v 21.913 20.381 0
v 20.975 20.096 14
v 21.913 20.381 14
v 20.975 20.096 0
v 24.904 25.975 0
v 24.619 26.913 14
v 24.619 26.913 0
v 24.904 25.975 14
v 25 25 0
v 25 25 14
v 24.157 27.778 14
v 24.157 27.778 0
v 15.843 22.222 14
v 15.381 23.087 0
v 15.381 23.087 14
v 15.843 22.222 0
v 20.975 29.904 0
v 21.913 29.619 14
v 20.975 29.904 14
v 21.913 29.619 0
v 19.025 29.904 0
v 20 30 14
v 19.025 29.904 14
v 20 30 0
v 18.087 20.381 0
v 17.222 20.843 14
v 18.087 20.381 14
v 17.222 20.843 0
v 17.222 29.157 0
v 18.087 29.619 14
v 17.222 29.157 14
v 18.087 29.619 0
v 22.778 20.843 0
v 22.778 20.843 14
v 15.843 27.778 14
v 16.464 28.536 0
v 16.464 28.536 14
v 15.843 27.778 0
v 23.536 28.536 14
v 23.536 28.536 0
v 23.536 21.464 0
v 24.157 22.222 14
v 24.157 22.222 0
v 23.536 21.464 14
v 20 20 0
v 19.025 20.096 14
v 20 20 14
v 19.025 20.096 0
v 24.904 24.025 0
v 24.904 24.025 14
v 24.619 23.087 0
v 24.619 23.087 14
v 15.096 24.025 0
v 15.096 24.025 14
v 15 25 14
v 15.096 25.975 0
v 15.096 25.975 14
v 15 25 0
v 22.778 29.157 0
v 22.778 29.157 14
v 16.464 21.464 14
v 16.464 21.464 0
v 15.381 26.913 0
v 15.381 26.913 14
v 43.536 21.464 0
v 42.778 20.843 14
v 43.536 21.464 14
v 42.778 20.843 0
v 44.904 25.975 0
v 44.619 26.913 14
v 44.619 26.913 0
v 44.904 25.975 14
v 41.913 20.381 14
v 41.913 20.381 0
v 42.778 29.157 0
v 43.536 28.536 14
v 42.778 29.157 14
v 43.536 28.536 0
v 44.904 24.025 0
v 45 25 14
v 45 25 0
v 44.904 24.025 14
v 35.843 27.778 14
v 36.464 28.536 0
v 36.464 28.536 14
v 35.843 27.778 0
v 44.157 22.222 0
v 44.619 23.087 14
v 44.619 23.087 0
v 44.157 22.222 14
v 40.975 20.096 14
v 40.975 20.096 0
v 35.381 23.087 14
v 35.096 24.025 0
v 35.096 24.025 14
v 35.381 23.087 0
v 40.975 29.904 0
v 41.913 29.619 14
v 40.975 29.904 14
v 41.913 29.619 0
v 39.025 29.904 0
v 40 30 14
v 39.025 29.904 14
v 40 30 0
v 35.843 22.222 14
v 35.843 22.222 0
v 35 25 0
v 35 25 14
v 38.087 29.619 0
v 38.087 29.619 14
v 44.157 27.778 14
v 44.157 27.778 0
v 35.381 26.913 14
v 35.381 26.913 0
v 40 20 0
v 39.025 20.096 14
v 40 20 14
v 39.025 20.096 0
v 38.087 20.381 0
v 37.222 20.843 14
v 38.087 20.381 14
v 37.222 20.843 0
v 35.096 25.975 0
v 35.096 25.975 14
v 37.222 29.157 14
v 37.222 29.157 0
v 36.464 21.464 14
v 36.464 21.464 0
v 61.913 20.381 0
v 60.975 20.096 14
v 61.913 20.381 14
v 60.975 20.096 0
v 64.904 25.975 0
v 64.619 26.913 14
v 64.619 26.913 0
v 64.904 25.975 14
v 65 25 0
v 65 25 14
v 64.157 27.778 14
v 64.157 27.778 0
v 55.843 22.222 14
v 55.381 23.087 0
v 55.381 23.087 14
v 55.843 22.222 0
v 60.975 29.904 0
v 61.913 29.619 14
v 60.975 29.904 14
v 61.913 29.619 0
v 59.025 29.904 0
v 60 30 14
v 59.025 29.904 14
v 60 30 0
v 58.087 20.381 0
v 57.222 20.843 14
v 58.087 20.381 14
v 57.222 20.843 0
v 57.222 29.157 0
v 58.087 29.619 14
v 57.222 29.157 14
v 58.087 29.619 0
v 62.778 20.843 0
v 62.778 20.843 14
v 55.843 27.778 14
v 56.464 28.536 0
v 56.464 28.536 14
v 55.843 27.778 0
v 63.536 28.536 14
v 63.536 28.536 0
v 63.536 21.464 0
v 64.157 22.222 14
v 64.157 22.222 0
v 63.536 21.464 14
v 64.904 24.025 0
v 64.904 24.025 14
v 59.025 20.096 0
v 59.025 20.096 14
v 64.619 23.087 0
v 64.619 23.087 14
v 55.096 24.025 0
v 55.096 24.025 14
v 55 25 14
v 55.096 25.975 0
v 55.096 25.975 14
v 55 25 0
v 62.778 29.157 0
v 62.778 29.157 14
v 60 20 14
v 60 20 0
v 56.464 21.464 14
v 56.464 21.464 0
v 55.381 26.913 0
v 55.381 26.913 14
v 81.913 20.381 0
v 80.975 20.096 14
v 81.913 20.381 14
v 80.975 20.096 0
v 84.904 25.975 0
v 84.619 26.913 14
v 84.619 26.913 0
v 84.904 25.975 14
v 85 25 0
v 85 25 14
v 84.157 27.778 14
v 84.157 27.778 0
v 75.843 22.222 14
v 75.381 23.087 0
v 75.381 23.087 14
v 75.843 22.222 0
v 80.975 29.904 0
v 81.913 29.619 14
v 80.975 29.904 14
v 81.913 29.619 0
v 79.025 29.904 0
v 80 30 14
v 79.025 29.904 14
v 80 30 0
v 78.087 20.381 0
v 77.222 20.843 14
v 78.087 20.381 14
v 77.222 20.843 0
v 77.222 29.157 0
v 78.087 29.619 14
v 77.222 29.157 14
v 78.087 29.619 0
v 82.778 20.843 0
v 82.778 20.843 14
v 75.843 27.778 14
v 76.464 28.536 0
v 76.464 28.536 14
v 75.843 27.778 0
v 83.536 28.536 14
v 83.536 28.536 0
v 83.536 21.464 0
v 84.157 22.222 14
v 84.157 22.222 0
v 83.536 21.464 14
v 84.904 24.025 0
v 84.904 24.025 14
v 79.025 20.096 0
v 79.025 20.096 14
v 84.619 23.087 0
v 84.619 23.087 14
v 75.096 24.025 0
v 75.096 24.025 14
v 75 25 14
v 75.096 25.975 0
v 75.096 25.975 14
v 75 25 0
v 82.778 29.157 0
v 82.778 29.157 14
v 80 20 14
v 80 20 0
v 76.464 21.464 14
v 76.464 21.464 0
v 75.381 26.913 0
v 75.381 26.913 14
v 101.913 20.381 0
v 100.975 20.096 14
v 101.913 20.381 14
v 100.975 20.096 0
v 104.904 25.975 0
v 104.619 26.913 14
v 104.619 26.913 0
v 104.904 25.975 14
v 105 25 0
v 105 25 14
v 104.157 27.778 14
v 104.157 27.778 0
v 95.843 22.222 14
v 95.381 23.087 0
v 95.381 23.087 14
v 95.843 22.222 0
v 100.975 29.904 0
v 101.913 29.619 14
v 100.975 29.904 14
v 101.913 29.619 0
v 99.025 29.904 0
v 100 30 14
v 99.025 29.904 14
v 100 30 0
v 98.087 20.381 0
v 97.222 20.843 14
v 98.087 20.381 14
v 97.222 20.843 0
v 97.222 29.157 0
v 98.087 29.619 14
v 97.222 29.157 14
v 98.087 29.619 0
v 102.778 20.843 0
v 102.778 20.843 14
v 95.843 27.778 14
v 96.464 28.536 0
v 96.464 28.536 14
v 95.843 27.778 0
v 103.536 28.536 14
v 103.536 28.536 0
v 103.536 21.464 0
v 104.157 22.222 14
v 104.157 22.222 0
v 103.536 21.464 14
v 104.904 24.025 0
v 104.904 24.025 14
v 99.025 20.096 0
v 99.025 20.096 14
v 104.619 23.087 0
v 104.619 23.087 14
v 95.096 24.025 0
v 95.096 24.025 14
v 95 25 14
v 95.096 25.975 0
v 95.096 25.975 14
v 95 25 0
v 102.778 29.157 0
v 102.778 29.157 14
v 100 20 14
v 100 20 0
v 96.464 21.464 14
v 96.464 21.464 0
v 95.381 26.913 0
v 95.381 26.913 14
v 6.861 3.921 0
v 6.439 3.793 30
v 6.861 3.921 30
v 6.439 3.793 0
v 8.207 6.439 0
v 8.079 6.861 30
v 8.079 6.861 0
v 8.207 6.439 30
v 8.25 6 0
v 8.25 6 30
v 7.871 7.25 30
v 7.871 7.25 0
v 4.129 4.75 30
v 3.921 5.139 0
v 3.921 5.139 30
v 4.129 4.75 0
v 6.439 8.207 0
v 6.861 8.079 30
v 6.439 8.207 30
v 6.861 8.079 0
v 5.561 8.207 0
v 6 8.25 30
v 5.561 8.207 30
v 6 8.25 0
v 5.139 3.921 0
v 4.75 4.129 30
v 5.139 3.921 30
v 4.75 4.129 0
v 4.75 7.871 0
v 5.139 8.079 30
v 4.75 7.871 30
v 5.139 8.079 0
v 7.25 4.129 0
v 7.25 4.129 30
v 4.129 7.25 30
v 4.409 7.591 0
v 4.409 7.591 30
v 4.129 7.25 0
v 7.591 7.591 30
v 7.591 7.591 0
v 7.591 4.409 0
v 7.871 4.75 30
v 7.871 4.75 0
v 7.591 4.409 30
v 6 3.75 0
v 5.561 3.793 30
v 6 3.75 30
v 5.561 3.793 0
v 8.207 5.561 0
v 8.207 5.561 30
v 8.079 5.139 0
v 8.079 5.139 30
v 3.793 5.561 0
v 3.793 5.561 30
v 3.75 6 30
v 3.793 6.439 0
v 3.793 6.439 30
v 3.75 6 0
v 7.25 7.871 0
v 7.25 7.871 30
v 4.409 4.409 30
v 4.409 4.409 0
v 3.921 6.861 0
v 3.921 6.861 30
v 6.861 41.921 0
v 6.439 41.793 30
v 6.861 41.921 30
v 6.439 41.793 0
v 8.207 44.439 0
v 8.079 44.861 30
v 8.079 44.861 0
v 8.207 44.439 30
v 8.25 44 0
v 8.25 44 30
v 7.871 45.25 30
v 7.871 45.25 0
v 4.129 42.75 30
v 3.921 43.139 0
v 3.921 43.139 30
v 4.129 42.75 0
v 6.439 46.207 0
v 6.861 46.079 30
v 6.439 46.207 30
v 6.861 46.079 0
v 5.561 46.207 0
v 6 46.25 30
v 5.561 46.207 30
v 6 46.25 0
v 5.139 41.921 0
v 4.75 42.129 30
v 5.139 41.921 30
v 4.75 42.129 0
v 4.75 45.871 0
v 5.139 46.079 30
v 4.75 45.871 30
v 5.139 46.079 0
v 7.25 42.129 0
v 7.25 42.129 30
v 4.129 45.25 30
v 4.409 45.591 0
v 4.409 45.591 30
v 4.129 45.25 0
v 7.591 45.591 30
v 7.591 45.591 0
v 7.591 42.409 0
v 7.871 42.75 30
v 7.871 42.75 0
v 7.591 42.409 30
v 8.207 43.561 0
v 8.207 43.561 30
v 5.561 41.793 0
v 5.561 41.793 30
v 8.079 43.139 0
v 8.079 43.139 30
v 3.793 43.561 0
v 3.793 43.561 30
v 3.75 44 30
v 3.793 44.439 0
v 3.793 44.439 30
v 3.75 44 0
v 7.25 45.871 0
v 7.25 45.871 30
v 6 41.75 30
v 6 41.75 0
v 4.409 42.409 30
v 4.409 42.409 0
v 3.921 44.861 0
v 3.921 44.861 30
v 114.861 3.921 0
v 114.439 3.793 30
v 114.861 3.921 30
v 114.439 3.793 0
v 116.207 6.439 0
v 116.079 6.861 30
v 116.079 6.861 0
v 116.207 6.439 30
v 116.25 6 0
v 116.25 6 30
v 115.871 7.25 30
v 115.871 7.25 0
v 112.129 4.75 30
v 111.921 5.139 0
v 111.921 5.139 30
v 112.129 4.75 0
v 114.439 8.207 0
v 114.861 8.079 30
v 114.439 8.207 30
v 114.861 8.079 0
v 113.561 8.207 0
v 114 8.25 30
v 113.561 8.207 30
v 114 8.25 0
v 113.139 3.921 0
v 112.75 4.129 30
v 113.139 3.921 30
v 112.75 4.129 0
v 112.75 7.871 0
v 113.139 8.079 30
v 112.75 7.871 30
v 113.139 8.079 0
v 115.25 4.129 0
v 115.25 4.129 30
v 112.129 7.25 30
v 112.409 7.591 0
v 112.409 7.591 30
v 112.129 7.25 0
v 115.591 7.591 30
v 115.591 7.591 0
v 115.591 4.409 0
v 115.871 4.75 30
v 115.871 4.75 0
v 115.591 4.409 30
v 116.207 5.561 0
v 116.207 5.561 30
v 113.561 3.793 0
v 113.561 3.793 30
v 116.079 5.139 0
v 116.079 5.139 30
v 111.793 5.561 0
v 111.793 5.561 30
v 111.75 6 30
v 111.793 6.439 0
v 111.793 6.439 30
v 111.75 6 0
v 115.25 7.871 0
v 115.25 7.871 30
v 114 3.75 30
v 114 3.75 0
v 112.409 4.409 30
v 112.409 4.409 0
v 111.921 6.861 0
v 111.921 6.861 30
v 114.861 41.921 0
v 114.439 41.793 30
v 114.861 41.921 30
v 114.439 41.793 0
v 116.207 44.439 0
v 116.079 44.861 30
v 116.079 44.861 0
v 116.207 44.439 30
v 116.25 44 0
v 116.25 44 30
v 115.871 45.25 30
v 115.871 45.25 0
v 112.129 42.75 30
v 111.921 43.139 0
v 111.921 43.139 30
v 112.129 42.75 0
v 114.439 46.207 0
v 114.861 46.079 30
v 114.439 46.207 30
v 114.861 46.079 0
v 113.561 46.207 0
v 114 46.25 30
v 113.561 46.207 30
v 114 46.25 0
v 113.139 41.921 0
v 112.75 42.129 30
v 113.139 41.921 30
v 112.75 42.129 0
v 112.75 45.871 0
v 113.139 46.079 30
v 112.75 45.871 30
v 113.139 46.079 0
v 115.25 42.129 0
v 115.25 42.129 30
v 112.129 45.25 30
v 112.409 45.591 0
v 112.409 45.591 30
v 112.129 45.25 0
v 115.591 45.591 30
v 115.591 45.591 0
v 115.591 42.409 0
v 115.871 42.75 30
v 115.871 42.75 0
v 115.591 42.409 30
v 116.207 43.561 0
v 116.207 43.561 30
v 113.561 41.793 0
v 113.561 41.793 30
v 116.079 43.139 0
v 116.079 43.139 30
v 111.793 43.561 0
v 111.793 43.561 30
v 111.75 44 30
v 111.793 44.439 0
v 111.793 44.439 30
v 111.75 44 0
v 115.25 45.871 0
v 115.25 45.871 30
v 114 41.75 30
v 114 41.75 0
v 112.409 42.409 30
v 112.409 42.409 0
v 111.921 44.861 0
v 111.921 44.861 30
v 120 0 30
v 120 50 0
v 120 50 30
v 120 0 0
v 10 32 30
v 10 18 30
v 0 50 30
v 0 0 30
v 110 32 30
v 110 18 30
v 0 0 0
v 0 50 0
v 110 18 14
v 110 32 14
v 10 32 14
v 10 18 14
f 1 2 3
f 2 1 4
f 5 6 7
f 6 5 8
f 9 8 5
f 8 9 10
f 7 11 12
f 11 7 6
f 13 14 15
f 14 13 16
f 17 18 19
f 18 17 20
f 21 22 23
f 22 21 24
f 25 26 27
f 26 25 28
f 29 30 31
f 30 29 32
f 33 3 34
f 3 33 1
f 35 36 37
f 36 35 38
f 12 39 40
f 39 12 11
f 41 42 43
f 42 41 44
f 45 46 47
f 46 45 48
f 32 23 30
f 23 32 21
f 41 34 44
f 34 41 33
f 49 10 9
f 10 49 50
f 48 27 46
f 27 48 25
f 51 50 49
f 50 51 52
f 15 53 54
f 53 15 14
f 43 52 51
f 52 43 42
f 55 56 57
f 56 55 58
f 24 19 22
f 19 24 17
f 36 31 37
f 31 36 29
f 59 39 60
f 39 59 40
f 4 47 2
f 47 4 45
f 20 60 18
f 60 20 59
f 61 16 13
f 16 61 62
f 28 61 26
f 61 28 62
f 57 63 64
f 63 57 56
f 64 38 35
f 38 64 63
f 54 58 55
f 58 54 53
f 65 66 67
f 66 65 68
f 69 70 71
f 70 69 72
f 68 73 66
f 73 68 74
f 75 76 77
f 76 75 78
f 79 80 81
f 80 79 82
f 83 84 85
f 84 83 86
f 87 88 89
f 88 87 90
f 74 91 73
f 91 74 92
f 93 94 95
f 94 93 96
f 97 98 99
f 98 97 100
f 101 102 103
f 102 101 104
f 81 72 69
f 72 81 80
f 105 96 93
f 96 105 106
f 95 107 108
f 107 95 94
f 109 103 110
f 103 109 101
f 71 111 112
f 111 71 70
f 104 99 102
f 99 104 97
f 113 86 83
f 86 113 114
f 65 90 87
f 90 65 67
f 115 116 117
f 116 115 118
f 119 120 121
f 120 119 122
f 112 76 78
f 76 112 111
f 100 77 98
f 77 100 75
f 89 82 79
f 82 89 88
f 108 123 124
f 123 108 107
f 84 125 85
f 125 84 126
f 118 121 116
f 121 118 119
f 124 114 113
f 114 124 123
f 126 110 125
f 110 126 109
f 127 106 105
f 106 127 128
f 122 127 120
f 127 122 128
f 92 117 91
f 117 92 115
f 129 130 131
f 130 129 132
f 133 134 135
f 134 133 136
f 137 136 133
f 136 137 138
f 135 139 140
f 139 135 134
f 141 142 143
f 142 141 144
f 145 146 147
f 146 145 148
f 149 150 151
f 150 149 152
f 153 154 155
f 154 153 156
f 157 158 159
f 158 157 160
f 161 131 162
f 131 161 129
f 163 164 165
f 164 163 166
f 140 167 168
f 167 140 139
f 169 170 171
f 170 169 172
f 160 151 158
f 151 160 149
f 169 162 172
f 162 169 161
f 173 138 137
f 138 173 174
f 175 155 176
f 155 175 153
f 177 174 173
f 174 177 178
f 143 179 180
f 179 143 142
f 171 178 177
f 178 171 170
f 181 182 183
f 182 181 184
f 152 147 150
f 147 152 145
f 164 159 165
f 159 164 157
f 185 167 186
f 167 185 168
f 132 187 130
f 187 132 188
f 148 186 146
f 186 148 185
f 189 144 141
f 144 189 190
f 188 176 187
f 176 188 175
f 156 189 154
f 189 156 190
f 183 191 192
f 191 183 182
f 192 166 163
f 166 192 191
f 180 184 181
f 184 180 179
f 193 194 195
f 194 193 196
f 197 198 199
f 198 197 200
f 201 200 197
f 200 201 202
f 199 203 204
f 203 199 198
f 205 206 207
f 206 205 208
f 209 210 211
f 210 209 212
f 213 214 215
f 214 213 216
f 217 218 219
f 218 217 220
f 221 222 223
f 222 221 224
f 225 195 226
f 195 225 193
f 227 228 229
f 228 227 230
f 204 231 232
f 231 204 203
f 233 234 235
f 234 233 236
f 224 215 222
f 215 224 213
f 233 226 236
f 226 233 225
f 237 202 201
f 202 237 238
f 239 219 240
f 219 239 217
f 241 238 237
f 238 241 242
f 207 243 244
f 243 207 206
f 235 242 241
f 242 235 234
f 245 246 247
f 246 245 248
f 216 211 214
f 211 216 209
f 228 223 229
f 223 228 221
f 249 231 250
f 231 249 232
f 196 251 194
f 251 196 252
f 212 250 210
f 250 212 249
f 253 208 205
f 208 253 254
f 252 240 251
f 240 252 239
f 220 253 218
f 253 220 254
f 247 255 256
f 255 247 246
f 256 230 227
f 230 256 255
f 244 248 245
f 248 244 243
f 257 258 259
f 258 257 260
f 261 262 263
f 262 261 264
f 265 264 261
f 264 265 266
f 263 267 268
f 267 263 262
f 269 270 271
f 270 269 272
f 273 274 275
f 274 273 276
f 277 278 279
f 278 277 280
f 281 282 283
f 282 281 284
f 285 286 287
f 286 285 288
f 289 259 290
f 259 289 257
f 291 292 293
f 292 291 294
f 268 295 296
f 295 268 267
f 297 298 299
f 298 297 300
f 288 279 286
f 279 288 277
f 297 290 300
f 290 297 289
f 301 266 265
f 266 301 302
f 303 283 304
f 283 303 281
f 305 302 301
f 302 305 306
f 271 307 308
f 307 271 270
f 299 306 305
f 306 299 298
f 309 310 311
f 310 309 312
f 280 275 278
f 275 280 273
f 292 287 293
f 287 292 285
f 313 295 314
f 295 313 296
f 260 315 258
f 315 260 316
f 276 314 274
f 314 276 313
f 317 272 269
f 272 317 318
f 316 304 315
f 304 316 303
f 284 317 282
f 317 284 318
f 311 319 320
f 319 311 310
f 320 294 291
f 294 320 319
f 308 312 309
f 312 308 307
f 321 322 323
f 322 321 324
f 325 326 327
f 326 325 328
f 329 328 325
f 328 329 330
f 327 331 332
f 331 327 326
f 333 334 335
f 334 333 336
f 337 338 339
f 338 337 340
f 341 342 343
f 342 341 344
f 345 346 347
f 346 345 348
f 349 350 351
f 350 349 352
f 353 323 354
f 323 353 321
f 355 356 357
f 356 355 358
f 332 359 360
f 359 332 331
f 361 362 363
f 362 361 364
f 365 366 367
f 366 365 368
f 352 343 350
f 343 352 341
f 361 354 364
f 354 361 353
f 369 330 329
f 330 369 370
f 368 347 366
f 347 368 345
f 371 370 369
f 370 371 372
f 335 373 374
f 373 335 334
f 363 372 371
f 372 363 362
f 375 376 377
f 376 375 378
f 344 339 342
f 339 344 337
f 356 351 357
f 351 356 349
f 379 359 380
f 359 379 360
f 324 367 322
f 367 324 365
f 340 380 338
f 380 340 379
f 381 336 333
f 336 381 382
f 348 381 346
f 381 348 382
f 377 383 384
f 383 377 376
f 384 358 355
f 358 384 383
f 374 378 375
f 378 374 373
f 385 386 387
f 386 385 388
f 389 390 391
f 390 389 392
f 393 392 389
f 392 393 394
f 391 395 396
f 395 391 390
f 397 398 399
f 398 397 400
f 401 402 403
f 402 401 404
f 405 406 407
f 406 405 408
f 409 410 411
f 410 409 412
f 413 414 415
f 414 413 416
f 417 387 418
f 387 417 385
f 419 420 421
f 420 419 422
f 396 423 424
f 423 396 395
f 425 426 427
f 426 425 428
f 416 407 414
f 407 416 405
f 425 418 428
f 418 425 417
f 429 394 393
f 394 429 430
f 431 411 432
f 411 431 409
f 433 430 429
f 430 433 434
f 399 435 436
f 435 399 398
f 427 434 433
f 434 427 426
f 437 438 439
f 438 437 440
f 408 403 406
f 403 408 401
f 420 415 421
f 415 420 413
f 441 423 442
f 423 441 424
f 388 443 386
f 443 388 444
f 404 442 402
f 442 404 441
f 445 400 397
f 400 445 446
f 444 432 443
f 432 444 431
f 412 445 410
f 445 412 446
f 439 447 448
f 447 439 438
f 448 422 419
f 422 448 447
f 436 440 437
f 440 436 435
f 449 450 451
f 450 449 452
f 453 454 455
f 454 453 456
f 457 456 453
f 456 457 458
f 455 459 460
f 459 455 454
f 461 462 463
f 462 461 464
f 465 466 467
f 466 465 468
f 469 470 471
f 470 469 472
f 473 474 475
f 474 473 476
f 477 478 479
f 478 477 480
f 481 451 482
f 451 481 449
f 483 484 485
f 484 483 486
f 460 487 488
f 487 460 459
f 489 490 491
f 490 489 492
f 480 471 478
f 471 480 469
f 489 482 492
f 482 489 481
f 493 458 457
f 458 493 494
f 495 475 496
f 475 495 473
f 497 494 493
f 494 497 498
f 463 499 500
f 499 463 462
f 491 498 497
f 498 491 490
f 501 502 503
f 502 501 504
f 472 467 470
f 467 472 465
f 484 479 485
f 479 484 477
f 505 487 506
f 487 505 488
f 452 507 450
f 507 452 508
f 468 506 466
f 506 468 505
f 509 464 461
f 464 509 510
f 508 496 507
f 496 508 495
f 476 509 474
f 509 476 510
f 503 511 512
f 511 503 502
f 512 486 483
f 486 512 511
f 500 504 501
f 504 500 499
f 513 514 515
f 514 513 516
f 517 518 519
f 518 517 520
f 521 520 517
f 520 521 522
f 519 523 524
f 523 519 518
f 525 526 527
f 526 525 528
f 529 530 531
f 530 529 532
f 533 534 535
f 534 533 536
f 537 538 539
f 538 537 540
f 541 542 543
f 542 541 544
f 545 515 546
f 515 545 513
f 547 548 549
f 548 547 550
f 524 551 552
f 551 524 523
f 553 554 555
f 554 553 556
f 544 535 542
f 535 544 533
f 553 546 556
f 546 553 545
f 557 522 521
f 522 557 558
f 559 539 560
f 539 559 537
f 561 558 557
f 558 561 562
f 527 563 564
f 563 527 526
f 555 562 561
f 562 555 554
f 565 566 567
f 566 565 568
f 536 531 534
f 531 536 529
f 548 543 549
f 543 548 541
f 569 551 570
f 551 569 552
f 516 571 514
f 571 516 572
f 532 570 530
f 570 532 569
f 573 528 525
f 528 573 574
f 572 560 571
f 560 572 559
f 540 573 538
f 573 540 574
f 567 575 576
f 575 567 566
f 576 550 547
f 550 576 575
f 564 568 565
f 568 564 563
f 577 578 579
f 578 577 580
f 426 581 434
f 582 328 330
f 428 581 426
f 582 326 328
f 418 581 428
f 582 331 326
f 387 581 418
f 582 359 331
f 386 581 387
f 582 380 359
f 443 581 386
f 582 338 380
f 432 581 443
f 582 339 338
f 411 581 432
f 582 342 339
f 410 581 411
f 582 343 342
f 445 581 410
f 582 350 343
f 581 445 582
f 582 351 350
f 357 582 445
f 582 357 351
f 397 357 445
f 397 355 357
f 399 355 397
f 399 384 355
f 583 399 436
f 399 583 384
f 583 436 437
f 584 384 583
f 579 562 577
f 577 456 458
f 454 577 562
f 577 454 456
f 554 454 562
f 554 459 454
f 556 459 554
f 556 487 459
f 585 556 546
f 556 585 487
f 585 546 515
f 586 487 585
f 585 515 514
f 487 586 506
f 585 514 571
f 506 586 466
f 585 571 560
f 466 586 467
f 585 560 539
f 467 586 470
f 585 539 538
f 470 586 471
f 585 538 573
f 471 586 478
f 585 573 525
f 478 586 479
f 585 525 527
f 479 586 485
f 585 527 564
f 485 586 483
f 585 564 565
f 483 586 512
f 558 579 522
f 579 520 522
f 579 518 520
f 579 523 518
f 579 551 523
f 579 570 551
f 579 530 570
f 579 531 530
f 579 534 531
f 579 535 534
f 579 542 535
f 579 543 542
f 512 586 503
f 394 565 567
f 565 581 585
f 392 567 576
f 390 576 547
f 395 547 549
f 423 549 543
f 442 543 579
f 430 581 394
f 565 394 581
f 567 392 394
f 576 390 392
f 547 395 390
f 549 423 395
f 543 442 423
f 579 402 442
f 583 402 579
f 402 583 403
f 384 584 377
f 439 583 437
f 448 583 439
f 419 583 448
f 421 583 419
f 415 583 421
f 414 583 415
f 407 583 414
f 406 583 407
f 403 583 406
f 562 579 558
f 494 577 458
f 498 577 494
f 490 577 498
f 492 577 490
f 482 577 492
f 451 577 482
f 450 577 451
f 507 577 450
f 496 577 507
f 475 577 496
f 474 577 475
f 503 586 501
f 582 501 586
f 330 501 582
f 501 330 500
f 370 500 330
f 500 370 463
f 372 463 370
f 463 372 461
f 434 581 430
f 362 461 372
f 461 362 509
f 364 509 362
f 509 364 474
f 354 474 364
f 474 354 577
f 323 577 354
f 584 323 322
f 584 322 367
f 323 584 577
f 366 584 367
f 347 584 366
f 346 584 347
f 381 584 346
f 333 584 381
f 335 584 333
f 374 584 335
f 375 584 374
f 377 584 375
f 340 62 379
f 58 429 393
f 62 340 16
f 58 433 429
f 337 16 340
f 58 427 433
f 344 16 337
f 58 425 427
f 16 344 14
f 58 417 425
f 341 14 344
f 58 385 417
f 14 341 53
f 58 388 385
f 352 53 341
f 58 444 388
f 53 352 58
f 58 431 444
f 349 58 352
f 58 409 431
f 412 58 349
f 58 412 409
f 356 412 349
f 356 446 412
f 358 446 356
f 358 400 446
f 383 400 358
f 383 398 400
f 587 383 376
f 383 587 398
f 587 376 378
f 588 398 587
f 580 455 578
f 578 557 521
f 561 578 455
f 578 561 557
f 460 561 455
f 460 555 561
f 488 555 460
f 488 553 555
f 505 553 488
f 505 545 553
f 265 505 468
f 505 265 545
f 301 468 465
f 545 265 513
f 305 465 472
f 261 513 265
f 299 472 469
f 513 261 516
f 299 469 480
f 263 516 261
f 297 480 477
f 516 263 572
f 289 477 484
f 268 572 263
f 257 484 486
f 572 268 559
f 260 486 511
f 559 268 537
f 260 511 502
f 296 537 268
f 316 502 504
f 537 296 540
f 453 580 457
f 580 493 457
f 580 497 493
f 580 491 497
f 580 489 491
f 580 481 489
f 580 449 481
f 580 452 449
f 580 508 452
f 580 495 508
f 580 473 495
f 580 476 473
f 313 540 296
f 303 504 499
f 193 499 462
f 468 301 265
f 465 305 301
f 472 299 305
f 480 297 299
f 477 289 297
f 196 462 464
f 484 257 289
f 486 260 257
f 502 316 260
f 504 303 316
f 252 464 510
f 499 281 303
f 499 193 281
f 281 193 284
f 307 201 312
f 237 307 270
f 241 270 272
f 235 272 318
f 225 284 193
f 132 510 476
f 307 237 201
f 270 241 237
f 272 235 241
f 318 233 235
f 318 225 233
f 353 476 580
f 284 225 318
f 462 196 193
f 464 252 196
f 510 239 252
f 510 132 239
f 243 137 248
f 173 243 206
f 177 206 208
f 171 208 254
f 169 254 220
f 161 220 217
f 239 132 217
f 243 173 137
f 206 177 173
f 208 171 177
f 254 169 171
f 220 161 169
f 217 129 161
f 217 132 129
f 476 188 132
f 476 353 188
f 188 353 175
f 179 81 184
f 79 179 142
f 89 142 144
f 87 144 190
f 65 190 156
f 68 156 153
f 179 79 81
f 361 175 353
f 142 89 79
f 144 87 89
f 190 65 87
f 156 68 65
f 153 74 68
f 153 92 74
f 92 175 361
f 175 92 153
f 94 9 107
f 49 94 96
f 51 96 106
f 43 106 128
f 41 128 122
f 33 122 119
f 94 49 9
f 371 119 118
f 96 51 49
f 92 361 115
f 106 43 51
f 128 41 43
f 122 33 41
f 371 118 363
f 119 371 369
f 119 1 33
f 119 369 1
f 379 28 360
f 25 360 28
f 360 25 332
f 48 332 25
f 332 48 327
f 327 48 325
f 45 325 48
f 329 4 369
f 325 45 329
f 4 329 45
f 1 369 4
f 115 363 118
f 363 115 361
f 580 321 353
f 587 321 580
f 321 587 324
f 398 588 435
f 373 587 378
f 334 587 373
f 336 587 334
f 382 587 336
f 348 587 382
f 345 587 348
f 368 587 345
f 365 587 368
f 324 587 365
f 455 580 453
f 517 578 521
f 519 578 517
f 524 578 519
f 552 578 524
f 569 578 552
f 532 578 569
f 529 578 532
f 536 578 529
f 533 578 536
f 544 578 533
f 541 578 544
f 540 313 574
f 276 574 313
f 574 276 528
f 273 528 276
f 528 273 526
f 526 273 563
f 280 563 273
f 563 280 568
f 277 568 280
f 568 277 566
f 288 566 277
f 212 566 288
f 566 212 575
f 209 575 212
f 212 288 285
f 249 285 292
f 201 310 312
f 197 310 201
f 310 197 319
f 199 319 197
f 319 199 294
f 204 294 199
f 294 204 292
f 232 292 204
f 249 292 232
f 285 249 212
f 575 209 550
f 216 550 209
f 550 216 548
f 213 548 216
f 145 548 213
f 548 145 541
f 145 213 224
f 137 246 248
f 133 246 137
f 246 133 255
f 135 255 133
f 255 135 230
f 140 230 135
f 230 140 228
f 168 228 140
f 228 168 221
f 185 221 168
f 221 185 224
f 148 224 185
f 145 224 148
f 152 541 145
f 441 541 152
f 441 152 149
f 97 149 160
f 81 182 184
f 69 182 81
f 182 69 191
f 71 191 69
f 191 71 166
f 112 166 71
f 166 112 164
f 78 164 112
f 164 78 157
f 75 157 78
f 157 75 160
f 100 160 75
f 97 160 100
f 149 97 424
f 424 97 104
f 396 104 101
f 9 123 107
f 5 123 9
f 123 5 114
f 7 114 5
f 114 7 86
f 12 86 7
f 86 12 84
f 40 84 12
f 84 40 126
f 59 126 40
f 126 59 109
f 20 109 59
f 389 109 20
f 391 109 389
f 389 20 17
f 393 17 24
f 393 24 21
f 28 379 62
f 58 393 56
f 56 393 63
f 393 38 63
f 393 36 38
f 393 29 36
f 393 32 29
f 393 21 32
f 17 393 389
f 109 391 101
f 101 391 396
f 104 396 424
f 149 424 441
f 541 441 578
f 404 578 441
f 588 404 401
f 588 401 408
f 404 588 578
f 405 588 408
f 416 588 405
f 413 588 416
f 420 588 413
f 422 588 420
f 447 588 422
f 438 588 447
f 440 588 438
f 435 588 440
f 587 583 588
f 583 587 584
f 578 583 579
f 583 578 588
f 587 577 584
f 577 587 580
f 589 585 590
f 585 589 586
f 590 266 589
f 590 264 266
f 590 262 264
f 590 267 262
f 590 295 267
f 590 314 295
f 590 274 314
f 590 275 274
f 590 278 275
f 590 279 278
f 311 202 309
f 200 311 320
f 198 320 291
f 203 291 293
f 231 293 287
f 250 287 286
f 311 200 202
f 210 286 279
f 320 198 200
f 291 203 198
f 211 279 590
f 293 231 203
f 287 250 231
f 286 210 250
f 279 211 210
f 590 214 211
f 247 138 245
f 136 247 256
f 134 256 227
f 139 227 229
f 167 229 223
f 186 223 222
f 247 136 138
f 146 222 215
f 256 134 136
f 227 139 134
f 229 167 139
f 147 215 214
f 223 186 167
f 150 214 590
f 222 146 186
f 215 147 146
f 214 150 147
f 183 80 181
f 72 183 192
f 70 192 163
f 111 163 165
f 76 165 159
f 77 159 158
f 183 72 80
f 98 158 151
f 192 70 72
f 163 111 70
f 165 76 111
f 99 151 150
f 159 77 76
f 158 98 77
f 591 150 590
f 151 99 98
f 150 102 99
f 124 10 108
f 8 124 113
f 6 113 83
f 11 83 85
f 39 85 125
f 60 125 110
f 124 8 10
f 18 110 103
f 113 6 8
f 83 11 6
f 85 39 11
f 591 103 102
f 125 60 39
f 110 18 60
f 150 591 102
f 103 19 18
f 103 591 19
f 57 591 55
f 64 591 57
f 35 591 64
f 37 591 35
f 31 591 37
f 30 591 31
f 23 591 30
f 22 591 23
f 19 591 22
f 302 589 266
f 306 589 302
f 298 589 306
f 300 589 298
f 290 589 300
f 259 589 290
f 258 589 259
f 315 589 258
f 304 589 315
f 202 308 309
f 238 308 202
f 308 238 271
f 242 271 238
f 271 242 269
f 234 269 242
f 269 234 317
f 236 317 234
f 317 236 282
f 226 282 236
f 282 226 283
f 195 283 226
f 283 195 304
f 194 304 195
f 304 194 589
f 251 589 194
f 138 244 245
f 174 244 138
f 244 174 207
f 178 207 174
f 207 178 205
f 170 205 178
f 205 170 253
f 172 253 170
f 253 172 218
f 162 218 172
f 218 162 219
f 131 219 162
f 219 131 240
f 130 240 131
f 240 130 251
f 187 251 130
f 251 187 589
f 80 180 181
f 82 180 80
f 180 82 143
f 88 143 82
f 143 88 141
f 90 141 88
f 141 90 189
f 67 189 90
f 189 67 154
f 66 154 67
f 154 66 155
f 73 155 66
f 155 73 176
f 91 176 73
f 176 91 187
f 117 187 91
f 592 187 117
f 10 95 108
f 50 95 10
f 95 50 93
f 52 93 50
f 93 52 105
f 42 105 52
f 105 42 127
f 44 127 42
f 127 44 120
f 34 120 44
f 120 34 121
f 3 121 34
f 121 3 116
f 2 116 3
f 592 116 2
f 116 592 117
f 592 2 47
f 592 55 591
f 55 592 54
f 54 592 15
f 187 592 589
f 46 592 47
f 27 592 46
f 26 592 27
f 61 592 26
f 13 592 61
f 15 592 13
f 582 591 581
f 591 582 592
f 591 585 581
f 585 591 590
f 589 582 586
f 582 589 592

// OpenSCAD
$fn = 32;

// ----------------------------------------------------------------------
// Manifold block: gallery_top manifold
// ----------------------------------------------------------------------

// --- parameters (mm) ---
block_l = 120;            // block length, X
block_w = 50;             // block width, Y
block_h = 30;             // block height, Z
port_d = 10;              // port bore diameter
port_pitch = 20;          // port pitch along X
gallery_d = 14;           // top gallery width, Y
gallery_depth = 16;       // gallery pocket depth
wall_p = 10;              // gallery end wall thickness, X
mnt_d = 4.5;              // mounting hole diameter
mnt_in = 6;               // mounting hole inset from the edges

n_ports = 5;  // ports in the row
port_x0 = (block_l - (n_ports - 1) * port_pitch) / 2;  // first port X

difference() {
  cube([block_l, block_w, block_h]);
  for (i = [0 : n_ports - 1])
    translate([port_x0 + i * port_pitch, block_w / 2, -1])
      cylinder(h = block_h + 2, d = port_d);
  translate([wall_p, block_w / 2 - gallery_d / 2, block_h - gallery_depth])
    cube([block_l - 2 * wall_p, gallery_d, gallery_depth + 1]);
  for (cx = [mnt_in, block_l - mnt_in])
    for (cy = [mnt_in, block_w - mnt_in])
      translate([cx, cy, -1]) cylinder(h = block_h + 2, d = mnt_d);
}
